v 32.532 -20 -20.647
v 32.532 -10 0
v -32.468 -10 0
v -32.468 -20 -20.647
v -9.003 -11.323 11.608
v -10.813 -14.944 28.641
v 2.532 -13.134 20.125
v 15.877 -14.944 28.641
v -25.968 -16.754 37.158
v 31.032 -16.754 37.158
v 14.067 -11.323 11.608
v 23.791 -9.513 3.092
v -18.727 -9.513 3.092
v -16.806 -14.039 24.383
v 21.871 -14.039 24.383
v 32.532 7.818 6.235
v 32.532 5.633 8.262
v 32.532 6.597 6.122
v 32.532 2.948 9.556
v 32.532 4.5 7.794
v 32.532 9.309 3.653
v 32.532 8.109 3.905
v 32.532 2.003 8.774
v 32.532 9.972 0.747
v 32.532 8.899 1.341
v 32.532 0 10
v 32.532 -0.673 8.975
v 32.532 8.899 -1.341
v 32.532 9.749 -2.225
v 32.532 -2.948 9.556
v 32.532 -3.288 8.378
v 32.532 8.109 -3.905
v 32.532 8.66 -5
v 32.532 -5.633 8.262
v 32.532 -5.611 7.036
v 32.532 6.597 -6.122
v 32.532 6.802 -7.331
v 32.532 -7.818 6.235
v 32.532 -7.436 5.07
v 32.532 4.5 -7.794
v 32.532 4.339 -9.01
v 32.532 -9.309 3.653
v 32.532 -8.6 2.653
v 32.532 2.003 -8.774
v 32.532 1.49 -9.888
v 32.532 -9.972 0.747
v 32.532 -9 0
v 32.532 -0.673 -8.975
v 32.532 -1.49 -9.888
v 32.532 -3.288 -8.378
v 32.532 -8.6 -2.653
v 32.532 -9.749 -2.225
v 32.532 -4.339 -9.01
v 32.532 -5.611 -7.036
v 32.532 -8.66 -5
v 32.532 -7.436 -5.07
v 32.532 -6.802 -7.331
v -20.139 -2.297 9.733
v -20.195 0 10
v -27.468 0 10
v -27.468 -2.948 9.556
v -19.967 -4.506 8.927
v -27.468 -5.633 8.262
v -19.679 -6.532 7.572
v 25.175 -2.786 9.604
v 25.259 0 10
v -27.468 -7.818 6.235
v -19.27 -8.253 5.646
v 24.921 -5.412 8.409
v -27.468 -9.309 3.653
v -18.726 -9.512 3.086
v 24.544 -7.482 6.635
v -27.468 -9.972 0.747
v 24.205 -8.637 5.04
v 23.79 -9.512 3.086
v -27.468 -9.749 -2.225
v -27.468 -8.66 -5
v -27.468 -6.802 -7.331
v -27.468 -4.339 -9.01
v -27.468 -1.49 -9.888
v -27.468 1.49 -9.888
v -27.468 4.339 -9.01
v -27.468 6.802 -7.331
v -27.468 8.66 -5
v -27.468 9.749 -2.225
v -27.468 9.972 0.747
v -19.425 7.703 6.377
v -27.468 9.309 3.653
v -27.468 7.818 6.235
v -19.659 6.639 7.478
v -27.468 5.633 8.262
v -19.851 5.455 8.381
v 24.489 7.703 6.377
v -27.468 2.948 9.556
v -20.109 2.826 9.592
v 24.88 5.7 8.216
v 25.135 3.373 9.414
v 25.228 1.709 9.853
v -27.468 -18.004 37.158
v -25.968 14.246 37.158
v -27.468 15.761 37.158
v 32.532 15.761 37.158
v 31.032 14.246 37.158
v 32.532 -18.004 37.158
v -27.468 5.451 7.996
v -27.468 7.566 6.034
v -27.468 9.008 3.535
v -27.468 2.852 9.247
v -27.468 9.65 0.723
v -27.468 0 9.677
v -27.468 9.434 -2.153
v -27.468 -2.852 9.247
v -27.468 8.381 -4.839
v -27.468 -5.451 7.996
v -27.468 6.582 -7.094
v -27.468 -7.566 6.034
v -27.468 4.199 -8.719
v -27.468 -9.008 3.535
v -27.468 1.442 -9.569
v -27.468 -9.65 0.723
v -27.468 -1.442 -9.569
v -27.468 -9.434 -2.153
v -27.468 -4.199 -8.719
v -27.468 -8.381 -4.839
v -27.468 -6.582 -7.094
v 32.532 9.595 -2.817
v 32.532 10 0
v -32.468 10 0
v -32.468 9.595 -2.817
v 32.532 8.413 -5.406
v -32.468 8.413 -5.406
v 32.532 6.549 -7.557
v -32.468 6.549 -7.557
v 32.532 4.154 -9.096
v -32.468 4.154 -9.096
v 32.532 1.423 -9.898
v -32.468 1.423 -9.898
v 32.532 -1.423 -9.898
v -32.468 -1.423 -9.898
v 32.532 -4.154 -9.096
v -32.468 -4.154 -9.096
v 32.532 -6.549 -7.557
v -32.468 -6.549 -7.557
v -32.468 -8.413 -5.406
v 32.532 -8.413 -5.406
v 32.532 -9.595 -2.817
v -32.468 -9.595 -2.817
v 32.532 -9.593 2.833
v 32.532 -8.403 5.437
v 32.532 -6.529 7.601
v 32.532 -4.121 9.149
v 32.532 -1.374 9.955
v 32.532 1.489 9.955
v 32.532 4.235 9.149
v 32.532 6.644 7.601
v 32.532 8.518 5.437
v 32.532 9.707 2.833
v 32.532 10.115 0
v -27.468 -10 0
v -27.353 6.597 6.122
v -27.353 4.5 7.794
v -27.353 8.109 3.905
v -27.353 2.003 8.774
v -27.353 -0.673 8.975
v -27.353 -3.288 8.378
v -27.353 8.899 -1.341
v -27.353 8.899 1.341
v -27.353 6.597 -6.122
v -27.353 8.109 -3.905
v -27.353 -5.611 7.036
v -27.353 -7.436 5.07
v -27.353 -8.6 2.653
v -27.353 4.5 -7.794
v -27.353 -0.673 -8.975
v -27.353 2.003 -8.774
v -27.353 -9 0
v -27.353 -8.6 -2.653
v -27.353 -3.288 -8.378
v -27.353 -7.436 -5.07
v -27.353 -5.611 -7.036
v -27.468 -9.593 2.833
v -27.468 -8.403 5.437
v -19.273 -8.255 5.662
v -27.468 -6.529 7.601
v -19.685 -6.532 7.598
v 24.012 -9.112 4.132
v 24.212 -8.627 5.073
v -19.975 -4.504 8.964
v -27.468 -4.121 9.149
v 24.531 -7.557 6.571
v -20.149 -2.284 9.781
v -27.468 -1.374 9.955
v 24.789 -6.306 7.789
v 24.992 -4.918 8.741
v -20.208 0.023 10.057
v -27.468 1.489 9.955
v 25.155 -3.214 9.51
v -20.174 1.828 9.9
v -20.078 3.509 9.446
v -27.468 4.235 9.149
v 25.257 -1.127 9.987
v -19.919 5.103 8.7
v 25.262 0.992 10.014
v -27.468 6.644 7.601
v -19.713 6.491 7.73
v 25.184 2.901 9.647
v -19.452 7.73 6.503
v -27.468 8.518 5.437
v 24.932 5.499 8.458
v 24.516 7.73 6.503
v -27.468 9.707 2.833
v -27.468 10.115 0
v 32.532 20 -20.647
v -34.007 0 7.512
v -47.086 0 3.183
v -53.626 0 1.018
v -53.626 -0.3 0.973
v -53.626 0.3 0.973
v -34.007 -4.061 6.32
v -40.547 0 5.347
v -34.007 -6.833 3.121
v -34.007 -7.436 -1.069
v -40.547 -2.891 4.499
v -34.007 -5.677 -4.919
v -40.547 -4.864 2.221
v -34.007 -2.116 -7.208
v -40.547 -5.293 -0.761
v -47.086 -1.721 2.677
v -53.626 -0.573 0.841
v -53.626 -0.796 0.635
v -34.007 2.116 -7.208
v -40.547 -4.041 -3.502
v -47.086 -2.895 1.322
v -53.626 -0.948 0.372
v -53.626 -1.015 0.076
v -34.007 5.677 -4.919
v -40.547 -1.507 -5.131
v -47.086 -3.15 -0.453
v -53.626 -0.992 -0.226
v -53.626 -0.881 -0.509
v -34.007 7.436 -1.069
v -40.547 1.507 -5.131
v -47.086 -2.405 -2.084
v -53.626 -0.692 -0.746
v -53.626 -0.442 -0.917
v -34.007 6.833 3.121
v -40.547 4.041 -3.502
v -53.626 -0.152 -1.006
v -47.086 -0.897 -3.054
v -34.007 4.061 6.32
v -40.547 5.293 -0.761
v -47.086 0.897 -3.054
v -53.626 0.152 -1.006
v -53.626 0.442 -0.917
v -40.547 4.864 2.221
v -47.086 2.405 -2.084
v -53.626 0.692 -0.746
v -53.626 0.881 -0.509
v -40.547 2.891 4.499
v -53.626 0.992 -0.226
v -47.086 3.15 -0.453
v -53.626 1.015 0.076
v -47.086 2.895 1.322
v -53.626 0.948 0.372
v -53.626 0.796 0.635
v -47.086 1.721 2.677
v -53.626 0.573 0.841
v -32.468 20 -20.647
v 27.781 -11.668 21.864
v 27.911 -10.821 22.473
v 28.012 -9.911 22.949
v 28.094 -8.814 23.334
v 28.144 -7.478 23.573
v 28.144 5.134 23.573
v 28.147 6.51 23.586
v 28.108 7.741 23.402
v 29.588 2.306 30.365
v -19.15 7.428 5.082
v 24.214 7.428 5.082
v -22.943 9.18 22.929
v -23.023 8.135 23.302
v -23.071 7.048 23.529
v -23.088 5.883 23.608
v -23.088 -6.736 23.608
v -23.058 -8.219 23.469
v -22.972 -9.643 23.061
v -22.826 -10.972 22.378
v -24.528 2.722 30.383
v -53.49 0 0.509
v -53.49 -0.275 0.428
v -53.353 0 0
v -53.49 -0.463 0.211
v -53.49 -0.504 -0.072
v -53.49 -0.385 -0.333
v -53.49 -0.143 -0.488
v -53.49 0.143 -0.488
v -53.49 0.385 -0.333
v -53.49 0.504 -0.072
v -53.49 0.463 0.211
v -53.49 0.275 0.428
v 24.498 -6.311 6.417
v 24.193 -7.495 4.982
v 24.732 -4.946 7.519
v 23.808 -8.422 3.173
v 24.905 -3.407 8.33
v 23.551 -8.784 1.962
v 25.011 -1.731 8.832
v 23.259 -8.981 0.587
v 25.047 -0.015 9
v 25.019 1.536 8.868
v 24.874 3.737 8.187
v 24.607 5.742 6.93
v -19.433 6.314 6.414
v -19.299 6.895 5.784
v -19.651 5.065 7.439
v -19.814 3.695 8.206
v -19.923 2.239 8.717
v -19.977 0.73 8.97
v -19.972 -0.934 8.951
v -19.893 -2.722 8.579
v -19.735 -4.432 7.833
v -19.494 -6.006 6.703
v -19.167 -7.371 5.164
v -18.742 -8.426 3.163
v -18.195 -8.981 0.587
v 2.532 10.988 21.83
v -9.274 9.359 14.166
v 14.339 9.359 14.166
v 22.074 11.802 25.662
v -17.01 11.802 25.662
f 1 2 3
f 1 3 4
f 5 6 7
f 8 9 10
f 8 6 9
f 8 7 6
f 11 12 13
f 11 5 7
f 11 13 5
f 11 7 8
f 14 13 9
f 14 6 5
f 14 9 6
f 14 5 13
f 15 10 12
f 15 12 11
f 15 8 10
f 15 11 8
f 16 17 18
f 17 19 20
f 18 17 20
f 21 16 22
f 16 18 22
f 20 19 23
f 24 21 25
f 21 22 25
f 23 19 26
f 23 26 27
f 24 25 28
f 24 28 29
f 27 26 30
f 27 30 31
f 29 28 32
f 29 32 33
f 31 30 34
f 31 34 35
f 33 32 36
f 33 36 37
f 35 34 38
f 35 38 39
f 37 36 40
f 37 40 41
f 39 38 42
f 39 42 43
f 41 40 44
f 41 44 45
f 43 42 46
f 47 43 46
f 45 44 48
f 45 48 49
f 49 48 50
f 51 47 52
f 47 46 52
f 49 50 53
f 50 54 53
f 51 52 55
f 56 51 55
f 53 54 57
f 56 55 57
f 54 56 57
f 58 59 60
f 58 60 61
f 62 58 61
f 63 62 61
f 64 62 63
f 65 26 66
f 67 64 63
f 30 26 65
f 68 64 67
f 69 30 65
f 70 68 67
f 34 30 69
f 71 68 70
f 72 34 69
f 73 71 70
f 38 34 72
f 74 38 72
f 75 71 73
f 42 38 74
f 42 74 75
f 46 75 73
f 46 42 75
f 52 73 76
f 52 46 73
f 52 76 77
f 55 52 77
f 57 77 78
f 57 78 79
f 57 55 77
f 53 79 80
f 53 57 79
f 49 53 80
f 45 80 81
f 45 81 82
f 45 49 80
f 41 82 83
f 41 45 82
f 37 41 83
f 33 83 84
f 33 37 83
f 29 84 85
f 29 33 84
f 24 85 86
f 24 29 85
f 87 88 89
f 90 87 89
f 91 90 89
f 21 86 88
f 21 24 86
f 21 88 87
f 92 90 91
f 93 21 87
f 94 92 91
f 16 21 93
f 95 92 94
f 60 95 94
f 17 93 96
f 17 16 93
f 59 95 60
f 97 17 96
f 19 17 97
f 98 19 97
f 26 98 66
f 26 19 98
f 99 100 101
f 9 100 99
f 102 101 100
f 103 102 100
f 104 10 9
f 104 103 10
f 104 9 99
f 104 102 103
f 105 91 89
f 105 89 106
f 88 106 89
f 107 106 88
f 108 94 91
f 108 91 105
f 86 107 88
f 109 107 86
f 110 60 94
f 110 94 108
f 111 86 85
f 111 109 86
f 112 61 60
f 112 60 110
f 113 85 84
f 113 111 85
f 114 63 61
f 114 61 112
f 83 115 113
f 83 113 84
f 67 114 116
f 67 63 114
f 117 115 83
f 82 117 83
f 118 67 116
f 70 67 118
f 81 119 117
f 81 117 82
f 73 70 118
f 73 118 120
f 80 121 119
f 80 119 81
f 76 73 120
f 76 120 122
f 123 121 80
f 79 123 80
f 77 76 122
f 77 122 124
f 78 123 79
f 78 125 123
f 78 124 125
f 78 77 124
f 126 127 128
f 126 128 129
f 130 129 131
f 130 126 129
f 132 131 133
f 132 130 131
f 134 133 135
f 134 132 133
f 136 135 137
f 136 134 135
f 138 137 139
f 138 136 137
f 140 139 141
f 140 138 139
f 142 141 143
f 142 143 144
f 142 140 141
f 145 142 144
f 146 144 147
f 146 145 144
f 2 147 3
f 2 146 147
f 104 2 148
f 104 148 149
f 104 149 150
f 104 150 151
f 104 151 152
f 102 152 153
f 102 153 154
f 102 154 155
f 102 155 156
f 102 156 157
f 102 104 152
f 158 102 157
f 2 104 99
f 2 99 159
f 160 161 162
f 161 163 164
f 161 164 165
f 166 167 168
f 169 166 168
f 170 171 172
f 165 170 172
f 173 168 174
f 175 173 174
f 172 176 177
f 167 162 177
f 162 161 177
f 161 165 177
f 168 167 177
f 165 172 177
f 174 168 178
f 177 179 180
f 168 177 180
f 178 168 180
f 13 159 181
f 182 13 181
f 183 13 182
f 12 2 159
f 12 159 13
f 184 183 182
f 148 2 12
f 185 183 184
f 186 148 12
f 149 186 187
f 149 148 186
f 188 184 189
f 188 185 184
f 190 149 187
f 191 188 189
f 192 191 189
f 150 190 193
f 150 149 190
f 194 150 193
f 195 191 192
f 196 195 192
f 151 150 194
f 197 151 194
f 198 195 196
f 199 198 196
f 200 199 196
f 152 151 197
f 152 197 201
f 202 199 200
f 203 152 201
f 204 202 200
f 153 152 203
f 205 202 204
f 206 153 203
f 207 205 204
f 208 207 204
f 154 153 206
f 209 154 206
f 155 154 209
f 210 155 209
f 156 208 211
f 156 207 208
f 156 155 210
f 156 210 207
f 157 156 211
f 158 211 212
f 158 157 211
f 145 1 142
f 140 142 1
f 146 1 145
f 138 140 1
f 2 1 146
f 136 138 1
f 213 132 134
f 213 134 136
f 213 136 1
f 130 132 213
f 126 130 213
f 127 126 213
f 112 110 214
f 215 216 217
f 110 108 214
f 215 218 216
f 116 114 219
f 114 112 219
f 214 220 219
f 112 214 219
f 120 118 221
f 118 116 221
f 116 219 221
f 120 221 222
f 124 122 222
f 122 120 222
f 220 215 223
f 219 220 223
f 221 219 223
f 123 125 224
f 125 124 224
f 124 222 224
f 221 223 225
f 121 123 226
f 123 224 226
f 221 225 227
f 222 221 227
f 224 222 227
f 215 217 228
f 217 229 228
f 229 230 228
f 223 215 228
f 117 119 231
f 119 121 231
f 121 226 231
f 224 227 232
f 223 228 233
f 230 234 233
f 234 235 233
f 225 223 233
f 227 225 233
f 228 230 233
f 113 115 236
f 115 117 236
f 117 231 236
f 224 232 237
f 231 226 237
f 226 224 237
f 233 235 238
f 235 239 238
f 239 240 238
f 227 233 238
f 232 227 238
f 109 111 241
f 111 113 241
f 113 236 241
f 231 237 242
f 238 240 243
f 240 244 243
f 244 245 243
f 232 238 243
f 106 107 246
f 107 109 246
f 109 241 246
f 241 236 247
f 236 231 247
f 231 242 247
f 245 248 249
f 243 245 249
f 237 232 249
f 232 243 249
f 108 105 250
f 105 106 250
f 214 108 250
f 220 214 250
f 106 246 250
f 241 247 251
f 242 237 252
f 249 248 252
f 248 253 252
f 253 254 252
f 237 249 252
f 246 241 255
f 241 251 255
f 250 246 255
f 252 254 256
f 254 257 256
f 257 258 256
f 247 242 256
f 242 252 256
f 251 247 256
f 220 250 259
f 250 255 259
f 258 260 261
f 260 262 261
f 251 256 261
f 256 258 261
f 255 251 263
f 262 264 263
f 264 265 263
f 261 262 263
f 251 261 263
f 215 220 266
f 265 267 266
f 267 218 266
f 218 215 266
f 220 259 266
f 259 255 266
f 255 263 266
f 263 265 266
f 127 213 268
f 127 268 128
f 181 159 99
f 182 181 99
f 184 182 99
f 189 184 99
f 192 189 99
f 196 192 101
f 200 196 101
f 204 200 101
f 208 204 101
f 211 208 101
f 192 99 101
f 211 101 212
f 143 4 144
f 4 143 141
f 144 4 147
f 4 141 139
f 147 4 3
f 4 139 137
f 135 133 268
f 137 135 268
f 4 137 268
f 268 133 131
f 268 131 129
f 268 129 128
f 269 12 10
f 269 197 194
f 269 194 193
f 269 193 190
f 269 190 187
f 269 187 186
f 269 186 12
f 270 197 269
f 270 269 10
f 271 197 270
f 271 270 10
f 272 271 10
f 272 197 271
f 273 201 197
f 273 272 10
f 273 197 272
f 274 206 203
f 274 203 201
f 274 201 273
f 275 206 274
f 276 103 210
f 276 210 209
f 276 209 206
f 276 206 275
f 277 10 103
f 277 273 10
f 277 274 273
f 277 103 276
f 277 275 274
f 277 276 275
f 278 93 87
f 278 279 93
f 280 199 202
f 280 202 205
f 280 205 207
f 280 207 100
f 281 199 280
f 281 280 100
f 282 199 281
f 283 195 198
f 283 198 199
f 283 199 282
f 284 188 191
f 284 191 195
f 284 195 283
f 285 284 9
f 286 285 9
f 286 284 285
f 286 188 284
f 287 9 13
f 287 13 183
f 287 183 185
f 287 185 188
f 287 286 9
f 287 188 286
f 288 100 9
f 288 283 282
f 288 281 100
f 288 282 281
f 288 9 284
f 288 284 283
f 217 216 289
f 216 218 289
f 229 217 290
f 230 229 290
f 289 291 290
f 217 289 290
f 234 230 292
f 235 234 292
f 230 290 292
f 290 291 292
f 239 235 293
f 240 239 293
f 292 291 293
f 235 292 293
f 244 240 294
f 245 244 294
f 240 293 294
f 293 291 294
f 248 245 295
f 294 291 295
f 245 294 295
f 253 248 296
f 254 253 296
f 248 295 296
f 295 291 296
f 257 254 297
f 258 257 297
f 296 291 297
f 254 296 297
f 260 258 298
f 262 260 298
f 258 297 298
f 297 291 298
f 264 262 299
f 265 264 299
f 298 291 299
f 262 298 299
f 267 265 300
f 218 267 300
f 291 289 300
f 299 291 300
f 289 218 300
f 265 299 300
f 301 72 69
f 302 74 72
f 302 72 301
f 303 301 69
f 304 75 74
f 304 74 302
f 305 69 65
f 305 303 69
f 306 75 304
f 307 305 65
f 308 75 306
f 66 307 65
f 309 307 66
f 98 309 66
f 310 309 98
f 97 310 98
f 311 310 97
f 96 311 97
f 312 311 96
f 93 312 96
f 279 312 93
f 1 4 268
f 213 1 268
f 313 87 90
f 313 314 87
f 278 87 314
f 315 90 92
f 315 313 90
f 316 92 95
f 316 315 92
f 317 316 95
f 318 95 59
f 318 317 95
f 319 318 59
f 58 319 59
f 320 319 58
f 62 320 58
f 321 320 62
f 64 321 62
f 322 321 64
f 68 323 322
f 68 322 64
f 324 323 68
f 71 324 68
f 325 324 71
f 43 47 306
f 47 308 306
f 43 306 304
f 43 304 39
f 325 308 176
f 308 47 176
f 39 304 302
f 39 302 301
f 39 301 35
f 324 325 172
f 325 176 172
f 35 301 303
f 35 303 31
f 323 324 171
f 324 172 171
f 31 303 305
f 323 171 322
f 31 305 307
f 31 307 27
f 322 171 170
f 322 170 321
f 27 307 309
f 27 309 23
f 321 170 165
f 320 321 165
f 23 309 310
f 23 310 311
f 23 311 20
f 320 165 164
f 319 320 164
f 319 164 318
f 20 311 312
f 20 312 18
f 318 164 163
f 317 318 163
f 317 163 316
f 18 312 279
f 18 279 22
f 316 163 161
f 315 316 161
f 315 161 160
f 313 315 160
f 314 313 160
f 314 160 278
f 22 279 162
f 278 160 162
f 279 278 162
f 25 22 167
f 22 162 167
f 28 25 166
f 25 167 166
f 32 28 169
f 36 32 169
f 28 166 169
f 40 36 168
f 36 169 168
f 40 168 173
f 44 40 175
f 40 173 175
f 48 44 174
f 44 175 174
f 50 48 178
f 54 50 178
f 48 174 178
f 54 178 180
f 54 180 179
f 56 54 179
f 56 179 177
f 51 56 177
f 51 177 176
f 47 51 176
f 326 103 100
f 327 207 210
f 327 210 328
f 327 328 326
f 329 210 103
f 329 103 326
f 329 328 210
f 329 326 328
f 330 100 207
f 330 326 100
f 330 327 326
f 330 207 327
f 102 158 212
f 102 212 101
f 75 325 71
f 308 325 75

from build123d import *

# Parameters (mm, degrees)
F0_W      = 60
F0_H      = 10
F2_R      = 9
F3_DEPTH  = 60
F7_DEPTH  = 60
F8_W      = 57
F8_H      = 31
F9_DEPTH  = 37
F9_TAPER  = 12
F11_DEPTH = 65


# Not quite as in the source:
# - ends of sketch curves that miss each other by under 0.0002 mm in the source are joined


with BuildPart() as f1:
    # F0 (on Front) → F1 (revolve)
    with BuildSketch(Plane.XZ):
        with Locations((2.5320472605, 5)):
            Rectangle(F0_W, F0_H)
    revolve(axis=Axis((2.5320472605, 0, 0), (1, 0, 0)))

    # F2 (on face) → F3 (cut)
    with BuildSketch(Plane(origin=(-27.4679527395, 0, 0), x_dir=(0, -1, 0), z_dir=(-1, 0, 0))):
        Circle(F2_R)
    extrude(amount=-F3_DEPTH, mode=Mode.SUBTRACT)

    # F4 (on Front) → F5 (revolve)
    with BuildSketch(Plane.XZ):
        Polygon((-27.3532667905, 0), (-27.3532667905, 9.7150442334), (-53.6260029736, 1.0178652923), (-53.3532667905, 0), align=None)
    revolve(axis=Axis((2.5320472605, 0, 0), (1, 0, 0)))


with BuildPart() as f7:
    # F6 (on face) → F7 (new body)
    with BuildSketch(Plane.YZ.offset(32.5320472605)):
        with BuildLine():
            Line((-18.0040858686, 37.1578894556), (-10, 0))
            ThreePointArc((-10, 0), (0.0573891046, 10.0573938269), (10.1147829316, 0))
            Line((10.1147829316, 0), (15.7607458532, 37.1578894556))
            Line((15.7607458532, 37.1578894556), (-18.0040858686, 37.1578894556))
        make_face()
    extrude(amount=-F7_DEPTH)


with BuildPart() as f9_tool:
    # F8 (on face) → F9 (new body)
    with BuildSketch(Plane.XY.offset(37.1578894556)):
        with Locations((2.5320472605, -1.2540858686)):
            Rectangle(F8_W, F8_H)
    extrude(amount=-F9_DEPTH, taper=F9_TAPER)


with BuildPart() as f1_1:
    add(f1.part)

    # F9: cut by f9_tool
    add(f9_tool.part, mode=Mode.SUBTRACT)


with BuildPart() as f7_1:
    add(f7.part)

    # F9: cut by f9_tool
    add(f9_tool.part, mode=Mode.SUBTRACT)


with BuildPart() as f11:
    # F10 (on face) → F11 (new body)
    with BuildSketch(Plane.YZ.offset(32.5320472605)):
        with BuildLine():
            ThreePointArc((10, 0), (0, -10), (-10, 0))
            Line((-10, 0), (-20, -20.6474160484))
            Line((-20, -20.6474160484), (20, -20.6474160484))
            Line((20, -20.6474160484), (10, 0))
        make_face()
    extrude(amount=-F11_DEPTH)


solid = Compound([f1_1.part, f7_1.part, f11.part])
